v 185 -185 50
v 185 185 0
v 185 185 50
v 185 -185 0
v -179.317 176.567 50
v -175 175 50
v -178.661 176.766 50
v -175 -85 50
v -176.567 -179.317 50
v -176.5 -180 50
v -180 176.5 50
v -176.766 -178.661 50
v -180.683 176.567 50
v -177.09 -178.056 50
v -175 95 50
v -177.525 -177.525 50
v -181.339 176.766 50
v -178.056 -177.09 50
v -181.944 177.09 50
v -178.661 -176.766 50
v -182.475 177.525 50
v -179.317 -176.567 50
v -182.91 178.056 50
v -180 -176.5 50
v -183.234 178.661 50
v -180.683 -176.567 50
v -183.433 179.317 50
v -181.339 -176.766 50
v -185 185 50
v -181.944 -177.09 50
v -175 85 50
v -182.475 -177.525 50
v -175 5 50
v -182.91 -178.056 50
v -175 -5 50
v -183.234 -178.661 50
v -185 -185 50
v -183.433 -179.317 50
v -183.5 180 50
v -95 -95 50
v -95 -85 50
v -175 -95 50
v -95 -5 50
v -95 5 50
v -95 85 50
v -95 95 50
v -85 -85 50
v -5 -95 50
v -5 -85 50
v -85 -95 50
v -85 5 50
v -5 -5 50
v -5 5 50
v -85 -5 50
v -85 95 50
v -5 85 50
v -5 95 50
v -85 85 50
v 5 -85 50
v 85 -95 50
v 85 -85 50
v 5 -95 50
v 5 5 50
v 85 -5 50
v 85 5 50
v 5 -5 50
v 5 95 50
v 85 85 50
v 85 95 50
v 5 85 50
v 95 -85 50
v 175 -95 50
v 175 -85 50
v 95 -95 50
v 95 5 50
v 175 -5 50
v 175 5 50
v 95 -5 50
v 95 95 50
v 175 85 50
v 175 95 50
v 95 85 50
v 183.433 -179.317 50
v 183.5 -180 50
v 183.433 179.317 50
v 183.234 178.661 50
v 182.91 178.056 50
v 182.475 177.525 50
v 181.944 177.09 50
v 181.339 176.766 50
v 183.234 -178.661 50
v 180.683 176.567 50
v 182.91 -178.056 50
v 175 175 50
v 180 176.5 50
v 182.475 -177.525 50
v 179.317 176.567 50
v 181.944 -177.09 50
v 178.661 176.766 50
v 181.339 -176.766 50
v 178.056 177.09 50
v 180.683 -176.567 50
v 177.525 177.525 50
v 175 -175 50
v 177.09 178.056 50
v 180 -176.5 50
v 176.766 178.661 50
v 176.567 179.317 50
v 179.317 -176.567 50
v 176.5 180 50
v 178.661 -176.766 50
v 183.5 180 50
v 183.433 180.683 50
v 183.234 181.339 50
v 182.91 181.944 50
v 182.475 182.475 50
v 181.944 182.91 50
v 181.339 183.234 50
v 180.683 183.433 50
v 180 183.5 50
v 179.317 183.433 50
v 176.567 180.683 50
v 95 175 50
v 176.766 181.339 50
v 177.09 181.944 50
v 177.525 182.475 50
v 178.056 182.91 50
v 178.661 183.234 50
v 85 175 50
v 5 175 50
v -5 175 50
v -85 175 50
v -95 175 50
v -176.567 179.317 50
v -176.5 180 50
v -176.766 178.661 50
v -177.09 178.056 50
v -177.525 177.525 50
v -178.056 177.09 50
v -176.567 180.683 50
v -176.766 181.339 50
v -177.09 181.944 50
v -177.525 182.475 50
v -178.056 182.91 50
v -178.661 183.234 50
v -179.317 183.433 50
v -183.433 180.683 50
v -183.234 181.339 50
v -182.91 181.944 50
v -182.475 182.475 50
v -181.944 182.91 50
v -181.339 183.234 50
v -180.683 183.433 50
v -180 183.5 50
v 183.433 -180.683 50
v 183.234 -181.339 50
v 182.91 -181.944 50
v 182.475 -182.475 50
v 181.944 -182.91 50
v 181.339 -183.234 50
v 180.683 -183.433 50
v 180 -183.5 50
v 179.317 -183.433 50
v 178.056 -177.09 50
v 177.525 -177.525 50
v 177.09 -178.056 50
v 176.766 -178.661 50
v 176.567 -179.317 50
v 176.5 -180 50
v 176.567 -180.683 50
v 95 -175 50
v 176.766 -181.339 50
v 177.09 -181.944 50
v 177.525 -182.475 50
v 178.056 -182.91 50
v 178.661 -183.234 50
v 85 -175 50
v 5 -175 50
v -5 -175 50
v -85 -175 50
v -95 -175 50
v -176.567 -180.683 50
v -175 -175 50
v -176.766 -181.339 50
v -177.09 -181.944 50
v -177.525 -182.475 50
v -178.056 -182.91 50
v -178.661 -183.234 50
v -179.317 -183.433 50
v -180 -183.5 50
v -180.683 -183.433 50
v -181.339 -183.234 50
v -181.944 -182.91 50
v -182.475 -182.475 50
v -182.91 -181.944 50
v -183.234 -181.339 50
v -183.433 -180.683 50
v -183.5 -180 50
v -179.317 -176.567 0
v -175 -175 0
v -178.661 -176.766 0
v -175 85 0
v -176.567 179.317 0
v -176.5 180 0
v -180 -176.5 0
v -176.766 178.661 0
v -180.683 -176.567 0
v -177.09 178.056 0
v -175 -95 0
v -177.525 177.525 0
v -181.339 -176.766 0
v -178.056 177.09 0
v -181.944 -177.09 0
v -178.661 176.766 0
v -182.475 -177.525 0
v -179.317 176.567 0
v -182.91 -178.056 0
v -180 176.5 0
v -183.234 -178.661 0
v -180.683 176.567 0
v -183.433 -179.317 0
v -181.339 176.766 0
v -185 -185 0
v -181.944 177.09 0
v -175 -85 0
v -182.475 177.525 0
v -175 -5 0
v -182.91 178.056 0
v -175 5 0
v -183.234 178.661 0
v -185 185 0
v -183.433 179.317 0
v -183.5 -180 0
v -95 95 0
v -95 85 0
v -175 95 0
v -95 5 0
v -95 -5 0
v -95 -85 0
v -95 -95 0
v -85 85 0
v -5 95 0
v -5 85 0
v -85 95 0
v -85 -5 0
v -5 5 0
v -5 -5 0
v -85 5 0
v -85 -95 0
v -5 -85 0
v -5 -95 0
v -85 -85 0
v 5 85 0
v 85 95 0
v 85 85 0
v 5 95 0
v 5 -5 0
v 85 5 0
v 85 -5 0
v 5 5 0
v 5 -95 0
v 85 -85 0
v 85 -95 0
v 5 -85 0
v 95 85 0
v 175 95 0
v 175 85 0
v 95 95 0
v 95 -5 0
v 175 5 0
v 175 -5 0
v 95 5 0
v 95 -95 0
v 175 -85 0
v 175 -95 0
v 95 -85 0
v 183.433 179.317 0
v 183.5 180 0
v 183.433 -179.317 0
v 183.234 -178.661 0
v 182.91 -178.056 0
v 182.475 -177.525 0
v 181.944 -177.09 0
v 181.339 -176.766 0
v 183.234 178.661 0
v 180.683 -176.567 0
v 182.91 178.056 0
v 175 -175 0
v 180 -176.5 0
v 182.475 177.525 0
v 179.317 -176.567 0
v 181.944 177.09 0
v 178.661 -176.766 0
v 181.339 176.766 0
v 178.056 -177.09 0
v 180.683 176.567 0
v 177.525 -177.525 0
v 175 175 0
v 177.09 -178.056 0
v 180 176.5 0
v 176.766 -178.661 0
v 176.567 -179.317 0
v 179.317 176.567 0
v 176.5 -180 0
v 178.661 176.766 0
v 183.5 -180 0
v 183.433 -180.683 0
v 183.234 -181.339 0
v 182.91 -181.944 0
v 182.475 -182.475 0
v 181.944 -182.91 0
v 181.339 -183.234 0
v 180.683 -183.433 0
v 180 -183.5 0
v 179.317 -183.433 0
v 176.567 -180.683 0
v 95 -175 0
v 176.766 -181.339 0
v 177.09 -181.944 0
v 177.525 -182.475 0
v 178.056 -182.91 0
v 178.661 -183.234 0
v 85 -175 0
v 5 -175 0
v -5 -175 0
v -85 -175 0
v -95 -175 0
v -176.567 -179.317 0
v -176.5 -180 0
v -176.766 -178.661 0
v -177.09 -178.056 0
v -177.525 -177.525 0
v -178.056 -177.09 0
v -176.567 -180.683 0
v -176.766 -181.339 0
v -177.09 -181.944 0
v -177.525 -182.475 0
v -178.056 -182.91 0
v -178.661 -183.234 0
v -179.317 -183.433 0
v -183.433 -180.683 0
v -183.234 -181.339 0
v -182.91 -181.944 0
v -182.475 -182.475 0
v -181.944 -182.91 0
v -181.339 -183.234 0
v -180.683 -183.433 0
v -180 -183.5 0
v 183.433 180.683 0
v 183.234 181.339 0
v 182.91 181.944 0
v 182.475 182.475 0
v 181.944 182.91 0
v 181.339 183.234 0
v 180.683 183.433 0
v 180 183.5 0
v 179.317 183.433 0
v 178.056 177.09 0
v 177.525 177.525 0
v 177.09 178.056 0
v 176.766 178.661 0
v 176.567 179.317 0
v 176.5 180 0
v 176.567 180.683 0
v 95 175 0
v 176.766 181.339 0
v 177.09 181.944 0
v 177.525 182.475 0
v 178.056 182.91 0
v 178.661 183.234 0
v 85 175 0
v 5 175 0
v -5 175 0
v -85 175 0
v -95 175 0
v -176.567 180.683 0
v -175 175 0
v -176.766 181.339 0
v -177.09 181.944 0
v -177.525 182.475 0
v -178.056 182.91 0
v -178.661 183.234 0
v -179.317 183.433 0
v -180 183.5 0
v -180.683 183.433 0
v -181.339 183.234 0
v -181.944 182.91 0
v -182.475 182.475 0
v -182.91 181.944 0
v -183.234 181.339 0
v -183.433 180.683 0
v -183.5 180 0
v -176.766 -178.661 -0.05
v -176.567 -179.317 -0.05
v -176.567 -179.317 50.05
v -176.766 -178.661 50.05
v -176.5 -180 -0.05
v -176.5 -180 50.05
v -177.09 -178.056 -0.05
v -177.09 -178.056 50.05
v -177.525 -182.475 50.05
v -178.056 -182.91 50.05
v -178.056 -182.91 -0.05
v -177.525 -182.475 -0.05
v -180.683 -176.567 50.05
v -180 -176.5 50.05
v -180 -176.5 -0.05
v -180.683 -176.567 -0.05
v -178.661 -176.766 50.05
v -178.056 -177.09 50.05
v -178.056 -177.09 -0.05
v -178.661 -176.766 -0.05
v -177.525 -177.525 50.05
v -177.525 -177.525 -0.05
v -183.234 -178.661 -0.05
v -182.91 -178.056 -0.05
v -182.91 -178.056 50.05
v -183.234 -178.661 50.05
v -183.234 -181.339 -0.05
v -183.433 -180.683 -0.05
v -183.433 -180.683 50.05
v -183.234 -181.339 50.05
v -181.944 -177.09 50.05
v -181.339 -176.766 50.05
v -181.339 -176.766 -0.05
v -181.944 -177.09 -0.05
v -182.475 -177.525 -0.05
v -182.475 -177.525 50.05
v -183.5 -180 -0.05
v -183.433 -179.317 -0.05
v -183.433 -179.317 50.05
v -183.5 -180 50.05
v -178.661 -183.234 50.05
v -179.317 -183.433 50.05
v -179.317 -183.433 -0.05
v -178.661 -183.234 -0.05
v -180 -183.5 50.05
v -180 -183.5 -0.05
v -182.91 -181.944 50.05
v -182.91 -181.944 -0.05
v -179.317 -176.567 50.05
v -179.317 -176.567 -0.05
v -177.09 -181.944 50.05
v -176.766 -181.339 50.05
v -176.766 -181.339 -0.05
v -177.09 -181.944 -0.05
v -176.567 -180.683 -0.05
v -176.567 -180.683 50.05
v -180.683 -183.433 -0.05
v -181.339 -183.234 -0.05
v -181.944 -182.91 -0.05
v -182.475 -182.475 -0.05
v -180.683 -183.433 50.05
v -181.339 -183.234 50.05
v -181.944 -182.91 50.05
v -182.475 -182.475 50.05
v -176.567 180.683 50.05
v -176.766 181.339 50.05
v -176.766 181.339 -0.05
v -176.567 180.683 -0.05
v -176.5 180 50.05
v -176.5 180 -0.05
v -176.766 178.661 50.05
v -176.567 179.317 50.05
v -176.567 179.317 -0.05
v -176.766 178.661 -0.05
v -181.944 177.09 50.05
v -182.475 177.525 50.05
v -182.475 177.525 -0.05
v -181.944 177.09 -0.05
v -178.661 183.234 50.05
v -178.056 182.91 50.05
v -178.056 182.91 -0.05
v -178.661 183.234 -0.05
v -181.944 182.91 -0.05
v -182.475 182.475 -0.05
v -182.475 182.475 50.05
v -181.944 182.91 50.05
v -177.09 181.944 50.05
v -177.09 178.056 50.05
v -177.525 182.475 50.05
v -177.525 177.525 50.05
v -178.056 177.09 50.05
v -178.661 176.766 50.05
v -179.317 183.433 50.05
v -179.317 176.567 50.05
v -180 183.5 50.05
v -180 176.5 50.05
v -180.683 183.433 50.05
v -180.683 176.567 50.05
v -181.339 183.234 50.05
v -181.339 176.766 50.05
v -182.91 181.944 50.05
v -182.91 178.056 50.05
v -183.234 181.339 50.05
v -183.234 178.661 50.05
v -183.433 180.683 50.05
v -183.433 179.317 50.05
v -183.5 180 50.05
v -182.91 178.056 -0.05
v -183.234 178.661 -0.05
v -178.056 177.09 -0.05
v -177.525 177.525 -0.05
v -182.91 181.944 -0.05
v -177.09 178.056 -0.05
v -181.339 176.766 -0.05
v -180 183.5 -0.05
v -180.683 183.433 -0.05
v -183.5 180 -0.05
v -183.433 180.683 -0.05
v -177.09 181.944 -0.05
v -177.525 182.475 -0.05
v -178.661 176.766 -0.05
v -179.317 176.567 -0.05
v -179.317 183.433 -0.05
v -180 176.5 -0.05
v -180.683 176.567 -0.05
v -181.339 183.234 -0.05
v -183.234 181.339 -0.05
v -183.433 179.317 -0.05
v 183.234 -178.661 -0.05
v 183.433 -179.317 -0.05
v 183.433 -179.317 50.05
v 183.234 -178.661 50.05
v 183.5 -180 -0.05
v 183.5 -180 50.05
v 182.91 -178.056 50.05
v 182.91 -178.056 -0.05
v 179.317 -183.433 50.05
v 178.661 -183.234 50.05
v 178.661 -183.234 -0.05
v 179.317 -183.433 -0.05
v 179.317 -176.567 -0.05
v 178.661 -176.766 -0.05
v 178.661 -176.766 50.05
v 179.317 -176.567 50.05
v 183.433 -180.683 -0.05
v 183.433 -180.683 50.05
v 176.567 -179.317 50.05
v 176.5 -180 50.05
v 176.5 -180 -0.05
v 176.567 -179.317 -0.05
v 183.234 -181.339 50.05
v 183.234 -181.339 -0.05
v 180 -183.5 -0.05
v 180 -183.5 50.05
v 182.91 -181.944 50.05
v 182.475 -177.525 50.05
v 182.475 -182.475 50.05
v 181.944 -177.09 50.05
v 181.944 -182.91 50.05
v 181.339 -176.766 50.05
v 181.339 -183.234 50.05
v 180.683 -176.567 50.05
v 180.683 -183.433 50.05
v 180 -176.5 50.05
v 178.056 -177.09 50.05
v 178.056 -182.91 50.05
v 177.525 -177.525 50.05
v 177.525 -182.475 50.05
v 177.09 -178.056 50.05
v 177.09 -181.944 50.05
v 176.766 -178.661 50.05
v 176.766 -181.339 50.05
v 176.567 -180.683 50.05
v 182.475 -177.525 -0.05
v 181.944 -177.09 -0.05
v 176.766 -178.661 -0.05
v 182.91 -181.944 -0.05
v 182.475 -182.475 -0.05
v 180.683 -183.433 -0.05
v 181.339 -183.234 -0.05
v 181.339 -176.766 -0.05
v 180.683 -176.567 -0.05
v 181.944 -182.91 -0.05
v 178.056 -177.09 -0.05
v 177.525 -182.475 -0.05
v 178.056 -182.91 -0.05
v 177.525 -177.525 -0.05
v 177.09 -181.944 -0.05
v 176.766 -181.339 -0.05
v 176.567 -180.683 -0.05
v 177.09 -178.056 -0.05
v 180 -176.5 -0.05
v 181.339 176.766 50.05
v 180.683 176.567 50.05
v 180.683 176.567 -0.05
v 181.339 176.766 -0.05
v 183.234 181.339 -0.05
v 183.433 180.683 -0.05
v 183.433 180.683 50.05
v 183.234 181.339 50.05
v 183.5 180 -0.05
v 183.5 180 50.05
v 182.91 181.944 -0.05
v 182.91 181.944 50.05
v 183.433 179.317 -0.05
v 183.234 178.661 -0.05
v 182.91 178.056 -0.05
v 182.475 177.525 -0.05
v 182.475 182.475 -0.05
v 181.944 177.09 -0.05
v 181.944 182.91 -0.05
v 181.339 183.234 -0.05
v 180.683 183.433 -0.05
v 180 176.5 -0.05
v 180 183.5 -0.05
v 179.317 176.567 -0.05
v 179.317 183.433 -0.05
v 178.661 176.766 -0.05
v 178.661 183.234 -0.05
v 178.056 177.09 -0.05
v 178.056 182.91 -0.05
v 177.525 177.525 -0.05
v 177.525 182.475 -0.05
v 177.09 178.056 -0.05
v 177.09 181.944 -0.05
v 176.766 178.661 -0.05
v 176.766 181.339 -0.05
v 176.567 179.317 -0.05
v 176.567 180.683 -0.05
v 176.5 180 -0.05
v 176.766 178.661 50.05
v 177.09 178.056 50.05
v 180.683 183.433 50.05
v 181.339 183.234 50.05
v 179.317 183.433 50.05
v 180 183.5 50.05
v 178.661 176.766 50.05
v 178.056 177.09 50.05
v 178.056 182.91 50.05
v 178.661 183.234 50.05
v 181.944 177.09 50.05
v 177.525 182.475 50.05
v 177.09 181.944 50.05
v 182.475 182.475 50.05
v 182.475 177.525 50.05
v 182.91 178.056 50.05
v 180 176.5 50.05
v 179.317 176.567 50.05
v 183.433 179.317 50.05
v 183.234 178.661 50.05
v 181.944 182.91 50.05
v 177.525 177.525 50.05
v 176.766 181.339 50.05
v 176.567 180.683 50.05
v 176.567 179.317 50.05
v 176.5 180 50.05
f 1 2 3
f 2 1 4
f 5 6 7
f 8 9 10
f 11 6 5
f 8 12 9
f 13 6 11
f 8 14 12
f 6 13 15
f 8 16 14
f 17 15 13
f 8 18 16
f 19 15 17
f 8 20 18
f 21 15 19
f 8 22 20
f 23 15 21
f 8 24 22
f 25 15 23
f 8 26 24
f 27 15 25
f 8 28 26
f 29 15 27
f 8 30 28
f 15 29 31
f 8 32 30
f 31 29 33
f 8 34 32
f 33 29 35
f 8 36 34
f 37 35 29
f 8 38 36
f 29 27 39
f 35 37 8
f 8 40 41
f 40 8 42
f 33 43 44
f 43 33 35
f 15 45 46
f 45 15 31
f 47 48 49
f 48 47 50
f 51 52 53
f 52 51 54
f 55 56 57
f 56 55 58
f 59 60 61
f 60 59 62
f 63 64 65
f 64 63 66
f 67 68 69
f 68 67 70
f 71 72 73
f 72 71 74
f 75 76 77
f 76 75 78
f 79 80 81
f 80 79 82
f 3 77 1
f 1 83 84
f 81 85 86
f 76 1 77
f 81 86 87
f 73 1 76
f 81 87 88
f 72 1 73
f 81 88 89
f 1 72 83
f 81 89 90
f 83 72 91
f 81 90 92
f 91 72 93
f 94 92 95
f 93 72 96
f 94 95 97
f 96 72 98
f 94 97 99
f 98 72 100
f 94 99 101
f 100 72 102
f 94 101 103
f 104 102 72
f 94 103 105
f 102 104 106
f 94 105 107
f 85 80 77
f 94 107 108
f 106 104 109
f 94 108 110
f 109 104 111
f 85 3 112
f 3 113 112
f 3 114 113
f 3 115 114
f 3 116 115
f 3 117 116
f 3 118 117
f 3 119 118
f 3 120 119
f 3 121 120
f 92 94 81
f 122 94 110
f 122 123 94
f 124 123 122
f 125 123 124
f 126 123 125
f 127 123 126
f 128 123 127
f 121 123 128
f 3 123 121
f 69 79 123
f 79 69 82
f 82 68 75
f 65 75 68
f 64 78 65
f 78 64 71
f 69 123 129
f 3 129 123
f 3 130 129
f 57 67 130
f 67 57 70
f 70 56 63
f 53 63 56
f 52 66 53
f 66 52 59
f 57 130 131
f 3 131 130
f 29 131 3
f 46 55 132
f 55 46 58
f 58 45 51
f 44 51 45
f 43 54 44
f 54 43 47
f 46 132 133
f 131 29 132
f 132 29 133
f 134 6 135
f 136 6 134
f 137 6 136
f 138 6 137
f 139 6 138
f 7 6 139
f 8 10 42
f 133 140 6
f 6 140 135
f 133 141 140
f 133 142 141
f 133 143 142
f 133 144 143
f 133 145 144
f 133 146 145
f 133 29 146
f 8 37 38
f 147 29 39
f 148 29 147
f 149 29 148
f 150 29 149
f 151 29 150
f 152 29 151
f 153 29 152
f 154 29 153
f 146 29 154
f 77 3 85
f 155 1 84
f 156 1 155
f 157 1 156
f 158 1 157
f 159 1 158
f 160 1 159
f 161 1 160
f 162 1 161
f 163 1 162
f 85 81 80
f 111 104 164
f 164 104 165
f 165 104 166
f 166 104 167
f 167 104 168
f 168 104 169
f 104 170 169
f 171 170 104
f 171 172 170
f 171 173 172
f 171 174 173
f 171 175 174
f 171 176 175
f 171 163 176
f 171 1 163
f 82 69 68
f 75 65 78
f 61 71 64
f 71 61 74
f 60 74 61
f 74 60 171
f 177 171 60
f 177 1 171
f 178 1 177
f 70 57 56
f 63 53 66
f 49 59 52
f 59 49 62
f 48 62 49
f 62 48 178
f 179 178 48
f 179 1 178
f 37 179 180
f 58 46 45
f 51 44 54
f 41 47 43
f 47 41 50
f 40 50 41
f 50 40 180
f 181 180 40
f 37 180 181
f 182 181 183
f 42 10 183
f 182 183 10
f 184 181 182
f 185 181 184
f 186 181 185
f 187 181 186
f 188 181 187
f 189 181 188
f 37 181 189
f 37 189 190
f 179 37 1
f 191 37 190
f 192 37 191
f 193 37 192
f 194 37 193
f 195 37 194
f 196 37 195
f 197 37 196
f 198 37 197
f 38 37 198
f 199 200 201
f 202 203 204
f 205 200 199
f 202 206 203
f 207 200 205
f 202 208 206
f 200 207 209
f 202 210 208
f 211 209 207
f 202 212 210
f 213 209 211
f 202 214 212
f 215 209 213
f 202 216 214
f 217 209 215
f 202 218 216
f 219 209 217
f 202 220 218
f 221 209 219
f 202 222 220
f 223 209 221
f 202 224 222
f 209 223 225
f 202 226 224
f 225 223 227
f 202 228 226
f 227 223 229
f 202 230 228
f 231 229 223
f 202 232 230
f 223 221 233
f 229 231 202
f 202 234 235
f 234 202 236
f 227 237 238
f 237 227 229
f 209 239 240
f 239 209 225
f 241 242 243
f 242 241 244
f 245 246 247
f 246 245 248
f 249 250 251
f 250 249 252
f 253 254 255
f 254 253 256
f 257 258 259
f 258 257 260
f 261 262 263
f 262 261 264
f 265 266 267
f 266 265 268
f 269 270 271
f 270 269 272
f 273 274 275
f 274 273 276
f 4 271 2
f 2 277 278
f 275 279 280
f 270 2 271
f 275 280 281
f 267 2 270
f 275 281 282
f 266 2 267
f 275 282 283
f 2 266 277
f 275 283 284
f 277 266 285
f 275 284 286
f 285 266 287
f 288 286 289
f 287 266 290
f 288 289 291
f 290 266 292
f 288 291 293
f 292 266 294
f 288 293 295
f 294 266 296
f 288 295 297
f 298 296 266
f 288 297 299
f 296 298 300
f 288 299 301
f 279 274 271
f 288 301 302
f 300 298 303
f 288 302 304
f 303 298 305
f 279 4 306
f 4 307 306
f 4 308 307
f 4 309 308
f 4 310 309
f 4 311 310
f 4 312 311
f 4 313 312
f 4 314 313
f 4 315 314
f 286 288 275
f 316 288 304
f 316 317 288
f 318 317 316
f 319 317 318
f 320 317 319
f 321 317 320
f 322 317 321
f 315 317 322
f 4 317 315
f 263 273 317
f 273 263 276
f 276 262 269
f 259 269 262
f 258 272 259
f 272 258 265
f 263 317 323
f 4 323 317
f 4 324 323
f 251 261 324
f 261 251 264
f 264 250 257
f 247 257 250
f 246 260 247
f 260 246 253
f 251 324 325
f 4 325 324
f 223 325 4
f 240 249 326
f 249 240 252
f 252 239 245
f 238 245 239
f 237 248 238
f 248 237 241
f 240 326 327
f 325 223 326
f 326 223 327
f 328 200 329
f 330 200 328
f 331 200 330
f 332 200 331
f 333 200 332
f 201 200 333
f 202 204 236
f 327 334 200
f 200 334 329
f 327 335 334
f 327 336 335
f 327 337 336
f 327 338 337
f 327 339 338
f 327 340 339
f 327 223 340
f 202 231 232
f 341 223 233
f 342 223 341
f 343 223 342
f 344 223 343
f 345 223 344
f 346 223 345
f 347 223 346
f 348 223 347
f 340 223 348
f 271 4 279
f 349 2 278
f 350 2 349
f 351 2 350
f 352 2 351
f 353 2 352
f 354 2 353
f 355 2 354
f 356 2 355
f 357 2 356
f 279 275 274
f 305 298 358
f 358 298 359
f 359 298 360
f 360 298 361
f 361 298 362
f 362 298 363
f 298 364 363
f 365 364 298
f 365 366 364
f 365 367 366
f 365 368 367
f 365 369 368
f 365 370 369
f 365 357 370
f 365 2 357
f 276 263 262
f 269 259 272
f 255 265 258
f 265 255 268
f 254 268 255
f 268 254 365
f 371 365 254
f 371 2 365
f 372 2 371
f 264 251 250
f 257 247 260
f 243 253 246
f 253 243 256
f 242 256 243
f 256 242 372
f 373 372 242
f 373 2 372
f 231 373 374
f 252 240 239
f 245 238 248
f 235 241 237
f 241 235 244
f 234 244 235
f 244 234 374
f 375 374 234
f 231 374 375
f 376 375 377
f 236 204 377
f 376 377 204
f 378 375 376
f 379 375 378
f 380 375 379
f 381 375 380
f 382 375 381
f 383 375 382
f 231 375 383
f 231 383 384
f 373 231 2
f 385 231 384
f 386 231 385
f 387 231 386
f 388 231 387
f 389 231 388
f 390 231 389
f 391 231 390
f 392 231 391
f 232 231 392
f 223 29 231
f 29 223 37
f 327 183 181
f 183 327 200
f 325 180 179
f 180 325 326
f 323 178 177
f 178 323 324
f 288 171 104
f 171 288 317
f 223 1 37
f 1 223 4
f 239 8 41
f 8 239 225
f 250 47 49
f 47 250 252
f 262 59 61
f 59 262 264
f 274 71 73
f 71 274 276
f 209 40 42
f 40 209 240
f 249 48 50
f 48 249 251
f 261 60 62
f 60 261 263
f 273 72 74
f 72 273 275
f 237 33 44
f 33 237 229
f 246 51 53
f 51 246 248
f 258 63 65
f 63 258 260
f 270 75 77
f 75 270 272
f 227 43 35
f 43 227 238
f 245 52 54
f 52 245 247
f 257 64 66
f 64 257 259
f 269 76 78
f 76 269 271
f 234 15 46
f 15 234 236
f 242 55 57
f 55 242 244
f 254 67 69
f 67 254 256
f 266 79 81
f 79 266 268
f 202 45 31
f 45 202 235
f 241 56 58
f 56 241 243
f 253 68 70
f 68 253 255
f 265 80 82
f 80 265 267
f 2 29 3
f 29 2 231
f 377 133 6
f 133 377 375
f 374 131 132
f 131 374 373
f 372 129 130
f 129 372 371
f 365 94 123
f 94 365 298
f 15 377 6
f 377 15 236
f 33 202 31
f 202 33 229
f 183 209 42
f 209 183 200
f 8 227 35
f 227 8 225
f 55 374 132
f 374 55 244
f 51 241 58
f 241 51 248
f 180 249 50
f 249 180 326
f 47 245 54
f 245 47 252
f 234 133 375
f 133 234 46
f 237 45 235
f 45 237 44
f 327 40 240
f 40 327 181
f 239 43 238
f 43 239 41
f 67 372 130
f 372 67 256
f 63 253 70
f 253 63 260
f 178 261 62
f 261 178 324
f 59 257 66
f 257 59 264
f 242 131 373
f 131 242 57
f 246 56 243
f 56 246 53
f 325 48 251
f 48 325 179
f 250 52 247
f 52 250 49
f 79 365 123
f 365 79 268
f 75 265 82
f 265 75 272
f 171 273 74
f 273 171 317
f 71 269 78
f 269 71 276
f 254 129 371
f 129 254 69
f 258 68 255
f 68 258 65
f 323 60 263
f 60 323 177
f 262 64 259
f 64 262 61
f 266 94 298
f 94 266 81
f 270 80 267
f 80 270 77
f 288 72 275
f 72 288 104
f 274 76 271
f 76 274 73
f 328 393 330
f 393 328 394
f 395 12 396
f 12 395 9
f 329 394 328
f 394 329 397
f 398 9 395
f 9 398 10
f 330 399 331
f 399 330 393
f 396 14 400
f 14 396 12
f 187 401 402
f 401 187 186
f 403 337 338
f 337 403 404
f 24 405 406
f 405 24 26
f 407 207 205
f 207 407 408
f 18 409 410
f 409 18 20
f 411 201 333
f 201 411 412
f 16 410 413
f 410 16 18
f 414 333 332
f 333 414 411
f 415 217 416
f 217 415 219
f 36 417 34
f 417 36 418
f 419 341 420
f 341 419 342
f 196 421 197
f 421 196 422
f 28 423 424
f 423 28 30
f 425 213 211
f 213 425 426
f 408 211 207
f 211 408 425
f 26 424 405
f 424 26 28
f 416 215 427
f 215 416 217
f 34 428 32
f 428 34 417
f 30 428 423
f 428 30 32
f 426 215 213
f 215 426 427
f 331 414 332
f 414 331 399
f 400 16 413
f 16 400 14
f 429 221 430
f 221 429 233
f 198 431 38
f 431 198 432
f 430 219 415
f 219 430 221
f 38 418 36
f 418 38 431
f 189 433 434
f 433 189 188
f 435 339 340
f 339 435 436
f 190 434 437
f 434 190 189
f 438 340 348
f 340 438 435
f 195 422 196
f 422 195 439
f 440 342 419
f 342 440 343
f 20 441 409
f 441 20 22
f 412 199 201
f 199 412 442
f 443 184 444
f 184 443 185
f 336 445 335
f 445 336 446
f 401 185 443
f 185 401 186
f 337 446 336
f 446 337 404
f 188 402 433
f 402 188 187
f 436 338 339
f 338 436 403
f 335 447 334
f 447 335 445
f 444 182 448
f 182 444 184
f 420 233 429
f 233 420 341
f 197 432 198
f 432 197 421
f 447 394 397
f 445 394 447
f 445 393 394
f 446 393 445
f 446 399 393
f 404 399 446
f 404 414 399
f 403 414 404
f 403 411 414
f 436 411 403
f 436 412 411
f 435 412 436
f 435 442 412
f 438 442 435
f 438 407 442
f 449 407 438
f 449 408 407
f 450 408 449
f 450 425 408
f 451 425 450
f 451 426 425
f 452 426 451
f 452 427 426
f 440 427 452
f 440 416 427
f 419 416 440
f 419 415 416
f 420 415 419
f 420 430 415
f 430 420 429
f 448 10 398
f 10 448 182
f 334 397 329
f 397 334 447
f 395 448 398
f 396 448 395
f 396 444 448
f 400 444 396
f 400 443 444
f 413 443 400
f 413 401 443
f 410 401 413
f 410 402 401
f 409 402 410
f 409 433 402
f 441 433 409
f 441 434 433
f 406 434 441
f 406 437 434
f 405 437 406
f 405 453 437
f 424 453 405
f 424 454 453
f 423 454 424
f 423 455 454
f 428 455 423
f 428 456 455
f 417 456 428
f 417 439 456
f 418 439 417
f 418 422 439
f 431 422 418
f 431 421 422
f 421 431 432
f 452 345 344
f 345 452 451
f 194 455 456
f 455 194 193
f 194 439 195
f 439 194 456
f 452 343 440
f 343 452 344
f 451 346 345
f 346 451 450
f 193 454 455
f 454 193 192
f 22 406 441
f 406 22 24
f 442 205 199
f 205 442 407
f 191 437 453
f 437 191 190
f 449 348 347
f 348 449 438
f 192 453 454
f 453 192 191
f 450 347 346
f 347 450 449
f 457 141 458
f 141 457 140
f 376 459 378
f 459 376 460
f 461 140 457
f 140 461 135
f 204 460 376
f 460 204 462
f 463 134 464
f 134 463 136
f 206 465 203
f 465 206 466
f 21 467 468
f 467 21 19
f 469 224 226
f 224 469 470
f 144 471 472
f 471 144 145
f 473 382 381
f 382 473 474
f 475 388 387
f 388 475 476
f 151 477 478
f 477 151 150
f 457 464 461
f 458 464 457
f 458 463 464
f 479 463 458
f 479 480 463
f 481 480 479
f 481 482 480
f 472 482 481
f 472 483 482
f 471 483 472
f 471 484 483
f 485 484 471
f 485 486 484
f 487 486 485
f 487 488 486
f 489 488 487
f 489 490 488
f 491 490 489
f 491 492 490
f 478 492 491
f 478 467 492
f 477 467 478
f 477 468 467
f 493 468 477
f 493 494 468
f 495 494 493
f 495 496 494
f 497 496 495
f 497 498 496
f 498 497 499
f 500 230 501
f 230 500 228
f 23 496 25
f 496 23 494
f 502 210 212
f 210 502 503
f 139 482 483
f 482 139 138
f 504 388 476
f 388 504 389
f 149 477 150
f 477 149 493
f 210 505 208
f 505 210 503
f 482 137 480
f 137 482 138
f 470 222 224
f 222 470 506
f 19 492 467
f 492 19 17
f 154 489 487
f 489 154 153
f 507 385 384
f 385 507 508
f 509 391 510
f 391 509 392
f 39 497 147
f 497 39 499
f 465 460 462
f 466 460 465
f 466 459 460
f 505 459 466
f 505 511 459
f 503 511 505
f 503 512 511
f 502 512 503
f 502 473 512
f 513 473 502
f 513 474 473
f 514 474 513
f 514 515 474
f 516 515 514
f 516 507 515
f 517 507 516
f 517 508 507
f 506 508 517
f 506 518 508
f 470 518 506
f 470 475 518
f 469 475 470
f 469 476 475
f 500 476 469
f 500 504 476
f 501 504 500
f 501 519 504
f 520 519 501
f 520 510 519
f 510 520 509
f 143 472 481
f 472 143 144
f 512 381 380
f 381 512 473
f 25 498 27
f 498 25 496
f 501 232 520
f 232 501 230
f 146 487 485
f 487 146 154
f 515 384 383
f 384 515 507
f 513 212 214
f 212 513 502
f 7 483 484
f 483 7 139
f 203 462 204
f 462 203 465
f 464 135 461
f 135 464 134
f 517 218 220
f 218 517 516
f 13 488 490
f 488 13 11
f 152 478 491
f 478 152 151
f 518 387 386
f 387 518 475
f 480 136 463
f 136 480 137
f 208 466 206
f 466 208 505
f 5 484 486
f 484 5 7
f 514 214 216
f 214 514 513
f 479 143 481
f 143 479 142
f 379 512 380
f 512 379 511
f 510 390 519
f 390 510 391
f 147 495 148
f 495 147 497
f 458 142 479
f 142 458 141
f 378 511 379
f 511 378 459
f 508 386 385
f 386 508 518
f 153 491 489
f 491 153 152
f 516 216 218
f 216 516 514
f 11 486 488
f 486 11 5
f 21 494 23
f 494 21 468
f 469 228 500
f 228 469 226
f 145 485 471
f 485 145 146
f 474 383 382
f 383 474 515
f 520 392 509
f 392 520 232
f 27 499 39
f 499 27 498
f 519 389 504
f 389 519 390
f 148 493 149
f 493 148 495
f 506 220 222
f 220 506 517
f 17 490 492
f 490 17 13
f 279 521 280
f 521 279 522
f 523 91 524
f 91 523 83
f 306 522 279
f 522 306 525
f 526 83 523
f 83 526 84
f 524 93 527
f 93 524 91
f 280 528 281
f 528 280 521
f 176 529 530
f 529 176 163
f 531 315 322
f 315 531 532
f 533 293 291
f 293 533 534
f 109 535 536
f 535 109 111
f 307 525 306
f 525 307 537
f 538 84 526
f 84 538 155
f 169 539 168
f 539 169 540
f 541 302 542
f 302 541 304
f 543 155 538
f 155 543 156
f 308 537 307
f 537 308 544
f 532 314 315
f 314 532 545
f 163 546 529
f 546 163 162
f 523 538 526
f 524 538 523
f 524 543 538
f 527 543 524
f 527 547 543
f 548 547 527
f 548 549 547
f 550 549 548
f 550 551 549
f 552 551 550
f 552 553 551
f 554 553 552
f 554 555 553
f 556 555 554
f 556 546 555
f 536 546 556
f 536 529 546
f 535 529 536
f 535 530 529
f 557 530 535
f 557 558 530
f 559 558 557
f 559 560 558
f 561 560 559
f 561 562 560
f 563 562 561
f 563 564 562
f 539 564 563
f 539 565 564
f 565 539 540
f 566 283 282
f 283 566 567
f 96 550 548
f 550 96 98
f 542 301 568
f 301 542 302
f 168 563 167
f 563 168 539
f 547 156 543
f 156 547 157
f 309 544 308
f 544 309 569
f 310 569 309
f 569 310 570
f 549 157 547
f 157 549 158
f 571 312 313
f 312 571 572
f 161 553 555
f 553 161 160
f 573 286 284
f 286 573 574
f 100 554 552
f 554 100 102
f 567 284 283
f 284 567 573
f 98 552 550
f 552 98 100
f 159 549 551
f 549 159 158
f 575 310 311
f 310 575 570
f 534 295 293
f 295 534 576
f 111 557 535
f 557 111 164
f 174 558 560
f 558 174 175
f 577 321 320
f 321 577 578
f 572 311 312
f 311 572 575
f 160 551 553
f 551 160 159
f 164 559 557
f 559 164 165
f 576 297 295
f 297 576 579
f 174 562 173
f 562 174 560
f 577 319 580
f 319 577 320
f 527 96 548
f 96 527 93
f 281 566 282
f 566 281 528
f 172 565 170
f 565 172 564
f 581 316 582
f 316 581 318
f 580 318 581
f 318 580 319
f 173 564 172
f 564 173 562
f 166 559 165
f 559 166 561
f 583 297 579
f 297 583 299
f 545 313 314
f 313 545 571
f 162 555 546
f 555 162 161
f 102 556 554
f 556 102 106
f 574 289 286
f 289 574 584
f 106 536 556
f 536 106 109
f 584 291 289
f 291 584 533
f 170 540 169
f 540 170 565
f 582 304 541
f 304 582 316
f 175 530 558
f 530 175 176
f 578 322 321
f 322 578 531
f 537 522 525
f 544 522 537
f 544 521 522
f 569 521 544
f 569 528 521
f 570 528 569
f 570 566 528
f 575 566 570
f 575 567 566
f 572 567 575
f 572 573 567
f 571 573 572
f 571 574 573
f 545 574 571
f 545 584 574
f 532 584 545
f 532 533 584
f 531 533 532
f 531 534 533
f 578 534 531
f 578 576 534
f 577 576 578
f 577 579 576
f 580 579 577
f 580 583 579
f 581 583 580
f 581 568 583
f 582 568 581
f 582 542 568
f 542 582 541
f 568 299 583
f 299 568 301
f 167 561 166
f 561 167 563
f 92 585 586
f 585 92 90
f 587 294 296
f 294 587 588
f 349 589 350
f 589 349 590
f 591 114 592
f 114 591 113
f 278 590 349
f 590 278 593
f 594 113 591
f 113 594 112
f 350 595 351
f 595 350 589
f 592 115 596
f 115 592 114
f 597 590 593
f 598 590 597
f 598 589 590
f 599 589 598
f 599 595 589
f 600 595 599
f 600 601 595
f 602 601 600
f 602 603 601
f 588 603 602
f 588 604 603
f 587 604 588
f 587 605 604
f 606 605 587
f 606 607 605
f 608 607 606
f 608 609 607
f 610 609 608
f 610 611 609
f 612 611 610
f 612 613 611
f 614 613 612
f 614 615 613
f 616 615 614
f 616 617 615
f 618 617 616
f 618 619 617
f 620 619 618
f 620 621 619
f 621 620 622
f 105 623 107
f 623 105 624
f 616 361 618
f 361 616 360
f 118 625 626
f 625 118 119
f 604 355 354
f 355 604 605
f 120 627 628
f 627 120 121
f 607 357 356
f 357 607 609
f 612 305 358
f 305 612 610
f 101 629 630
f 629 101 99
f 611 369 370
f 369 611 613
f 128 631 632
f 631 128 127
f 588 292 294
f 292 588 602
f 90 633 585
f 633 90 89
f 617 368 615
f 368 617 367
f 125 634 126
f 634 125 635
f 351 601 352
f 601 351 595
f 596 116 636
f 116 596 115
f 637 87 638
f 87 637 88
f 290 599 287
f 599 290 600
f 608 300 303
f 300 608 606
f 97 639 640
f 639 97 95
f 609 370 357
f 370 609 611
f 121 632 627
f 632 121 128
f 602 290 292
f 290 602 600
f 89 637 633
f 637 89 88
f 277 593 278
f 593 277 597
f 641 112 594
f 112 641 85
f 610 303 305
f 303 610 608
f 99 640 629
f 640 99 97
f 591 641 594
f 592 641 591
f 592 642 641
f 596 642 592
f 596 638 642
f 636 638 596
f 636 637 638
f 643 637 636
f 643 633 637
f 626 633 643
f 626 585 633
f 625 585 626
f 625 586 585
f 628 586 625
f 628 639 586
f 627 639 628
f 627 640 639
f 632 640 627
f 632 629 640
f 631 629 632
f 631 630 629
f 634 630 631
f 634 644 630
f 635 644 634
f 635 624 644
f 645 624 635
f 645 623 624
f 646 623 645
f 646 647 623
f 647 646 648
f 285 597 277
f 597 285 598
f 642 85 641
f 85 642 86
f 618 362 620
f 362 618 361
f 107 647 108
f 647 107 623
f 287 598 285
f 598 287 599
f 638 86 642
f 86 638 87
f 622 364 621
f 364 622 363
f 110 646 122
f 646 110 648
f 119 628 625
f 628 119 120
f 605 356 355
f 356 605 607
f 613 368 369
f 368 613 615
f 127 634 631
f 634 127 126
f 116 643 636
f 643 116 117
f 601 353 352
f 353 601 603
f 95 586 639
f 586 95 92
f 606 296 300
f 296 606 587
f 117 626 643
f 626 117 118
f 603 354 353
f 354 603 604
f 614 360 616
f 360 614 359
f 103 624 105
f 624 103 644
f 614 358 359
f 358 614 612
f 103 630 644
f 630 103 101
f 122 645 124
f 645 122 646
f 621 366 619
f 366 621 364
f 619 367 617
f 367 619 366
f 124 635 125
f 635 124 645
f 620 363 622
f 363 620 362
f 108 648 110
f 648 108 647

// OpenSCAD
// Part Name: Cage_Layer_2_H50mm
// This part represents a horizontal slice of the cage.
// It is designed to be 3D printed on its base.

// Parameters for the cage
bar_t = 10;
gap_xy = 80;
hole_d = 7;
cage_ext_xy = 370;

// Calculate bar center positions relative to the overall cage center
bar_centers_xy = [for (j = [0:4]) (-cage_ext_xy/2 + bar_t/2 + j * (bar_t + gap_xy))];

// Module to generate a single layer segment
module cage_layer_segment(height) {
    // Offset for printing on z=0 plane. The module itself is centered on XY=0, so this Z offset moves its base to Z=0.
    translate([0, 0, height/2]) {
        union() {
            // Horizontal bars (along X)
            for (y_center = bar_centers_xy) {
                translate([0, y_center, 0])
                cube([cage_ext_xy, bar_t, height], center = true);
            }

            // Vertical bars (along Y)
            for (x_center = bar_centers_xy) {
                translate([x_center, 0, 0])
                cube([bar_t, cage_ext_xy, height], center = true);
            }

            // Subtract holes for M6 rods at the 4 corners
            corner_offsets_xy = [bar_centers_xy[0], bar_centers_xy[4]];

            for (x_offset = corner_offsets_xy) {
                for (y_offset = corner_offsets_xy) {
                    // Hole through the center of the corner bar
                    translate([x_offset, y_offset, 0])
                    cylinder(h = height + 0.1, d = hole_d, center = true, $fn=32); // +0.1 for clean cut
                }
            }
        }
    }
}

// Render the segment
cage_layer_segment(50);
